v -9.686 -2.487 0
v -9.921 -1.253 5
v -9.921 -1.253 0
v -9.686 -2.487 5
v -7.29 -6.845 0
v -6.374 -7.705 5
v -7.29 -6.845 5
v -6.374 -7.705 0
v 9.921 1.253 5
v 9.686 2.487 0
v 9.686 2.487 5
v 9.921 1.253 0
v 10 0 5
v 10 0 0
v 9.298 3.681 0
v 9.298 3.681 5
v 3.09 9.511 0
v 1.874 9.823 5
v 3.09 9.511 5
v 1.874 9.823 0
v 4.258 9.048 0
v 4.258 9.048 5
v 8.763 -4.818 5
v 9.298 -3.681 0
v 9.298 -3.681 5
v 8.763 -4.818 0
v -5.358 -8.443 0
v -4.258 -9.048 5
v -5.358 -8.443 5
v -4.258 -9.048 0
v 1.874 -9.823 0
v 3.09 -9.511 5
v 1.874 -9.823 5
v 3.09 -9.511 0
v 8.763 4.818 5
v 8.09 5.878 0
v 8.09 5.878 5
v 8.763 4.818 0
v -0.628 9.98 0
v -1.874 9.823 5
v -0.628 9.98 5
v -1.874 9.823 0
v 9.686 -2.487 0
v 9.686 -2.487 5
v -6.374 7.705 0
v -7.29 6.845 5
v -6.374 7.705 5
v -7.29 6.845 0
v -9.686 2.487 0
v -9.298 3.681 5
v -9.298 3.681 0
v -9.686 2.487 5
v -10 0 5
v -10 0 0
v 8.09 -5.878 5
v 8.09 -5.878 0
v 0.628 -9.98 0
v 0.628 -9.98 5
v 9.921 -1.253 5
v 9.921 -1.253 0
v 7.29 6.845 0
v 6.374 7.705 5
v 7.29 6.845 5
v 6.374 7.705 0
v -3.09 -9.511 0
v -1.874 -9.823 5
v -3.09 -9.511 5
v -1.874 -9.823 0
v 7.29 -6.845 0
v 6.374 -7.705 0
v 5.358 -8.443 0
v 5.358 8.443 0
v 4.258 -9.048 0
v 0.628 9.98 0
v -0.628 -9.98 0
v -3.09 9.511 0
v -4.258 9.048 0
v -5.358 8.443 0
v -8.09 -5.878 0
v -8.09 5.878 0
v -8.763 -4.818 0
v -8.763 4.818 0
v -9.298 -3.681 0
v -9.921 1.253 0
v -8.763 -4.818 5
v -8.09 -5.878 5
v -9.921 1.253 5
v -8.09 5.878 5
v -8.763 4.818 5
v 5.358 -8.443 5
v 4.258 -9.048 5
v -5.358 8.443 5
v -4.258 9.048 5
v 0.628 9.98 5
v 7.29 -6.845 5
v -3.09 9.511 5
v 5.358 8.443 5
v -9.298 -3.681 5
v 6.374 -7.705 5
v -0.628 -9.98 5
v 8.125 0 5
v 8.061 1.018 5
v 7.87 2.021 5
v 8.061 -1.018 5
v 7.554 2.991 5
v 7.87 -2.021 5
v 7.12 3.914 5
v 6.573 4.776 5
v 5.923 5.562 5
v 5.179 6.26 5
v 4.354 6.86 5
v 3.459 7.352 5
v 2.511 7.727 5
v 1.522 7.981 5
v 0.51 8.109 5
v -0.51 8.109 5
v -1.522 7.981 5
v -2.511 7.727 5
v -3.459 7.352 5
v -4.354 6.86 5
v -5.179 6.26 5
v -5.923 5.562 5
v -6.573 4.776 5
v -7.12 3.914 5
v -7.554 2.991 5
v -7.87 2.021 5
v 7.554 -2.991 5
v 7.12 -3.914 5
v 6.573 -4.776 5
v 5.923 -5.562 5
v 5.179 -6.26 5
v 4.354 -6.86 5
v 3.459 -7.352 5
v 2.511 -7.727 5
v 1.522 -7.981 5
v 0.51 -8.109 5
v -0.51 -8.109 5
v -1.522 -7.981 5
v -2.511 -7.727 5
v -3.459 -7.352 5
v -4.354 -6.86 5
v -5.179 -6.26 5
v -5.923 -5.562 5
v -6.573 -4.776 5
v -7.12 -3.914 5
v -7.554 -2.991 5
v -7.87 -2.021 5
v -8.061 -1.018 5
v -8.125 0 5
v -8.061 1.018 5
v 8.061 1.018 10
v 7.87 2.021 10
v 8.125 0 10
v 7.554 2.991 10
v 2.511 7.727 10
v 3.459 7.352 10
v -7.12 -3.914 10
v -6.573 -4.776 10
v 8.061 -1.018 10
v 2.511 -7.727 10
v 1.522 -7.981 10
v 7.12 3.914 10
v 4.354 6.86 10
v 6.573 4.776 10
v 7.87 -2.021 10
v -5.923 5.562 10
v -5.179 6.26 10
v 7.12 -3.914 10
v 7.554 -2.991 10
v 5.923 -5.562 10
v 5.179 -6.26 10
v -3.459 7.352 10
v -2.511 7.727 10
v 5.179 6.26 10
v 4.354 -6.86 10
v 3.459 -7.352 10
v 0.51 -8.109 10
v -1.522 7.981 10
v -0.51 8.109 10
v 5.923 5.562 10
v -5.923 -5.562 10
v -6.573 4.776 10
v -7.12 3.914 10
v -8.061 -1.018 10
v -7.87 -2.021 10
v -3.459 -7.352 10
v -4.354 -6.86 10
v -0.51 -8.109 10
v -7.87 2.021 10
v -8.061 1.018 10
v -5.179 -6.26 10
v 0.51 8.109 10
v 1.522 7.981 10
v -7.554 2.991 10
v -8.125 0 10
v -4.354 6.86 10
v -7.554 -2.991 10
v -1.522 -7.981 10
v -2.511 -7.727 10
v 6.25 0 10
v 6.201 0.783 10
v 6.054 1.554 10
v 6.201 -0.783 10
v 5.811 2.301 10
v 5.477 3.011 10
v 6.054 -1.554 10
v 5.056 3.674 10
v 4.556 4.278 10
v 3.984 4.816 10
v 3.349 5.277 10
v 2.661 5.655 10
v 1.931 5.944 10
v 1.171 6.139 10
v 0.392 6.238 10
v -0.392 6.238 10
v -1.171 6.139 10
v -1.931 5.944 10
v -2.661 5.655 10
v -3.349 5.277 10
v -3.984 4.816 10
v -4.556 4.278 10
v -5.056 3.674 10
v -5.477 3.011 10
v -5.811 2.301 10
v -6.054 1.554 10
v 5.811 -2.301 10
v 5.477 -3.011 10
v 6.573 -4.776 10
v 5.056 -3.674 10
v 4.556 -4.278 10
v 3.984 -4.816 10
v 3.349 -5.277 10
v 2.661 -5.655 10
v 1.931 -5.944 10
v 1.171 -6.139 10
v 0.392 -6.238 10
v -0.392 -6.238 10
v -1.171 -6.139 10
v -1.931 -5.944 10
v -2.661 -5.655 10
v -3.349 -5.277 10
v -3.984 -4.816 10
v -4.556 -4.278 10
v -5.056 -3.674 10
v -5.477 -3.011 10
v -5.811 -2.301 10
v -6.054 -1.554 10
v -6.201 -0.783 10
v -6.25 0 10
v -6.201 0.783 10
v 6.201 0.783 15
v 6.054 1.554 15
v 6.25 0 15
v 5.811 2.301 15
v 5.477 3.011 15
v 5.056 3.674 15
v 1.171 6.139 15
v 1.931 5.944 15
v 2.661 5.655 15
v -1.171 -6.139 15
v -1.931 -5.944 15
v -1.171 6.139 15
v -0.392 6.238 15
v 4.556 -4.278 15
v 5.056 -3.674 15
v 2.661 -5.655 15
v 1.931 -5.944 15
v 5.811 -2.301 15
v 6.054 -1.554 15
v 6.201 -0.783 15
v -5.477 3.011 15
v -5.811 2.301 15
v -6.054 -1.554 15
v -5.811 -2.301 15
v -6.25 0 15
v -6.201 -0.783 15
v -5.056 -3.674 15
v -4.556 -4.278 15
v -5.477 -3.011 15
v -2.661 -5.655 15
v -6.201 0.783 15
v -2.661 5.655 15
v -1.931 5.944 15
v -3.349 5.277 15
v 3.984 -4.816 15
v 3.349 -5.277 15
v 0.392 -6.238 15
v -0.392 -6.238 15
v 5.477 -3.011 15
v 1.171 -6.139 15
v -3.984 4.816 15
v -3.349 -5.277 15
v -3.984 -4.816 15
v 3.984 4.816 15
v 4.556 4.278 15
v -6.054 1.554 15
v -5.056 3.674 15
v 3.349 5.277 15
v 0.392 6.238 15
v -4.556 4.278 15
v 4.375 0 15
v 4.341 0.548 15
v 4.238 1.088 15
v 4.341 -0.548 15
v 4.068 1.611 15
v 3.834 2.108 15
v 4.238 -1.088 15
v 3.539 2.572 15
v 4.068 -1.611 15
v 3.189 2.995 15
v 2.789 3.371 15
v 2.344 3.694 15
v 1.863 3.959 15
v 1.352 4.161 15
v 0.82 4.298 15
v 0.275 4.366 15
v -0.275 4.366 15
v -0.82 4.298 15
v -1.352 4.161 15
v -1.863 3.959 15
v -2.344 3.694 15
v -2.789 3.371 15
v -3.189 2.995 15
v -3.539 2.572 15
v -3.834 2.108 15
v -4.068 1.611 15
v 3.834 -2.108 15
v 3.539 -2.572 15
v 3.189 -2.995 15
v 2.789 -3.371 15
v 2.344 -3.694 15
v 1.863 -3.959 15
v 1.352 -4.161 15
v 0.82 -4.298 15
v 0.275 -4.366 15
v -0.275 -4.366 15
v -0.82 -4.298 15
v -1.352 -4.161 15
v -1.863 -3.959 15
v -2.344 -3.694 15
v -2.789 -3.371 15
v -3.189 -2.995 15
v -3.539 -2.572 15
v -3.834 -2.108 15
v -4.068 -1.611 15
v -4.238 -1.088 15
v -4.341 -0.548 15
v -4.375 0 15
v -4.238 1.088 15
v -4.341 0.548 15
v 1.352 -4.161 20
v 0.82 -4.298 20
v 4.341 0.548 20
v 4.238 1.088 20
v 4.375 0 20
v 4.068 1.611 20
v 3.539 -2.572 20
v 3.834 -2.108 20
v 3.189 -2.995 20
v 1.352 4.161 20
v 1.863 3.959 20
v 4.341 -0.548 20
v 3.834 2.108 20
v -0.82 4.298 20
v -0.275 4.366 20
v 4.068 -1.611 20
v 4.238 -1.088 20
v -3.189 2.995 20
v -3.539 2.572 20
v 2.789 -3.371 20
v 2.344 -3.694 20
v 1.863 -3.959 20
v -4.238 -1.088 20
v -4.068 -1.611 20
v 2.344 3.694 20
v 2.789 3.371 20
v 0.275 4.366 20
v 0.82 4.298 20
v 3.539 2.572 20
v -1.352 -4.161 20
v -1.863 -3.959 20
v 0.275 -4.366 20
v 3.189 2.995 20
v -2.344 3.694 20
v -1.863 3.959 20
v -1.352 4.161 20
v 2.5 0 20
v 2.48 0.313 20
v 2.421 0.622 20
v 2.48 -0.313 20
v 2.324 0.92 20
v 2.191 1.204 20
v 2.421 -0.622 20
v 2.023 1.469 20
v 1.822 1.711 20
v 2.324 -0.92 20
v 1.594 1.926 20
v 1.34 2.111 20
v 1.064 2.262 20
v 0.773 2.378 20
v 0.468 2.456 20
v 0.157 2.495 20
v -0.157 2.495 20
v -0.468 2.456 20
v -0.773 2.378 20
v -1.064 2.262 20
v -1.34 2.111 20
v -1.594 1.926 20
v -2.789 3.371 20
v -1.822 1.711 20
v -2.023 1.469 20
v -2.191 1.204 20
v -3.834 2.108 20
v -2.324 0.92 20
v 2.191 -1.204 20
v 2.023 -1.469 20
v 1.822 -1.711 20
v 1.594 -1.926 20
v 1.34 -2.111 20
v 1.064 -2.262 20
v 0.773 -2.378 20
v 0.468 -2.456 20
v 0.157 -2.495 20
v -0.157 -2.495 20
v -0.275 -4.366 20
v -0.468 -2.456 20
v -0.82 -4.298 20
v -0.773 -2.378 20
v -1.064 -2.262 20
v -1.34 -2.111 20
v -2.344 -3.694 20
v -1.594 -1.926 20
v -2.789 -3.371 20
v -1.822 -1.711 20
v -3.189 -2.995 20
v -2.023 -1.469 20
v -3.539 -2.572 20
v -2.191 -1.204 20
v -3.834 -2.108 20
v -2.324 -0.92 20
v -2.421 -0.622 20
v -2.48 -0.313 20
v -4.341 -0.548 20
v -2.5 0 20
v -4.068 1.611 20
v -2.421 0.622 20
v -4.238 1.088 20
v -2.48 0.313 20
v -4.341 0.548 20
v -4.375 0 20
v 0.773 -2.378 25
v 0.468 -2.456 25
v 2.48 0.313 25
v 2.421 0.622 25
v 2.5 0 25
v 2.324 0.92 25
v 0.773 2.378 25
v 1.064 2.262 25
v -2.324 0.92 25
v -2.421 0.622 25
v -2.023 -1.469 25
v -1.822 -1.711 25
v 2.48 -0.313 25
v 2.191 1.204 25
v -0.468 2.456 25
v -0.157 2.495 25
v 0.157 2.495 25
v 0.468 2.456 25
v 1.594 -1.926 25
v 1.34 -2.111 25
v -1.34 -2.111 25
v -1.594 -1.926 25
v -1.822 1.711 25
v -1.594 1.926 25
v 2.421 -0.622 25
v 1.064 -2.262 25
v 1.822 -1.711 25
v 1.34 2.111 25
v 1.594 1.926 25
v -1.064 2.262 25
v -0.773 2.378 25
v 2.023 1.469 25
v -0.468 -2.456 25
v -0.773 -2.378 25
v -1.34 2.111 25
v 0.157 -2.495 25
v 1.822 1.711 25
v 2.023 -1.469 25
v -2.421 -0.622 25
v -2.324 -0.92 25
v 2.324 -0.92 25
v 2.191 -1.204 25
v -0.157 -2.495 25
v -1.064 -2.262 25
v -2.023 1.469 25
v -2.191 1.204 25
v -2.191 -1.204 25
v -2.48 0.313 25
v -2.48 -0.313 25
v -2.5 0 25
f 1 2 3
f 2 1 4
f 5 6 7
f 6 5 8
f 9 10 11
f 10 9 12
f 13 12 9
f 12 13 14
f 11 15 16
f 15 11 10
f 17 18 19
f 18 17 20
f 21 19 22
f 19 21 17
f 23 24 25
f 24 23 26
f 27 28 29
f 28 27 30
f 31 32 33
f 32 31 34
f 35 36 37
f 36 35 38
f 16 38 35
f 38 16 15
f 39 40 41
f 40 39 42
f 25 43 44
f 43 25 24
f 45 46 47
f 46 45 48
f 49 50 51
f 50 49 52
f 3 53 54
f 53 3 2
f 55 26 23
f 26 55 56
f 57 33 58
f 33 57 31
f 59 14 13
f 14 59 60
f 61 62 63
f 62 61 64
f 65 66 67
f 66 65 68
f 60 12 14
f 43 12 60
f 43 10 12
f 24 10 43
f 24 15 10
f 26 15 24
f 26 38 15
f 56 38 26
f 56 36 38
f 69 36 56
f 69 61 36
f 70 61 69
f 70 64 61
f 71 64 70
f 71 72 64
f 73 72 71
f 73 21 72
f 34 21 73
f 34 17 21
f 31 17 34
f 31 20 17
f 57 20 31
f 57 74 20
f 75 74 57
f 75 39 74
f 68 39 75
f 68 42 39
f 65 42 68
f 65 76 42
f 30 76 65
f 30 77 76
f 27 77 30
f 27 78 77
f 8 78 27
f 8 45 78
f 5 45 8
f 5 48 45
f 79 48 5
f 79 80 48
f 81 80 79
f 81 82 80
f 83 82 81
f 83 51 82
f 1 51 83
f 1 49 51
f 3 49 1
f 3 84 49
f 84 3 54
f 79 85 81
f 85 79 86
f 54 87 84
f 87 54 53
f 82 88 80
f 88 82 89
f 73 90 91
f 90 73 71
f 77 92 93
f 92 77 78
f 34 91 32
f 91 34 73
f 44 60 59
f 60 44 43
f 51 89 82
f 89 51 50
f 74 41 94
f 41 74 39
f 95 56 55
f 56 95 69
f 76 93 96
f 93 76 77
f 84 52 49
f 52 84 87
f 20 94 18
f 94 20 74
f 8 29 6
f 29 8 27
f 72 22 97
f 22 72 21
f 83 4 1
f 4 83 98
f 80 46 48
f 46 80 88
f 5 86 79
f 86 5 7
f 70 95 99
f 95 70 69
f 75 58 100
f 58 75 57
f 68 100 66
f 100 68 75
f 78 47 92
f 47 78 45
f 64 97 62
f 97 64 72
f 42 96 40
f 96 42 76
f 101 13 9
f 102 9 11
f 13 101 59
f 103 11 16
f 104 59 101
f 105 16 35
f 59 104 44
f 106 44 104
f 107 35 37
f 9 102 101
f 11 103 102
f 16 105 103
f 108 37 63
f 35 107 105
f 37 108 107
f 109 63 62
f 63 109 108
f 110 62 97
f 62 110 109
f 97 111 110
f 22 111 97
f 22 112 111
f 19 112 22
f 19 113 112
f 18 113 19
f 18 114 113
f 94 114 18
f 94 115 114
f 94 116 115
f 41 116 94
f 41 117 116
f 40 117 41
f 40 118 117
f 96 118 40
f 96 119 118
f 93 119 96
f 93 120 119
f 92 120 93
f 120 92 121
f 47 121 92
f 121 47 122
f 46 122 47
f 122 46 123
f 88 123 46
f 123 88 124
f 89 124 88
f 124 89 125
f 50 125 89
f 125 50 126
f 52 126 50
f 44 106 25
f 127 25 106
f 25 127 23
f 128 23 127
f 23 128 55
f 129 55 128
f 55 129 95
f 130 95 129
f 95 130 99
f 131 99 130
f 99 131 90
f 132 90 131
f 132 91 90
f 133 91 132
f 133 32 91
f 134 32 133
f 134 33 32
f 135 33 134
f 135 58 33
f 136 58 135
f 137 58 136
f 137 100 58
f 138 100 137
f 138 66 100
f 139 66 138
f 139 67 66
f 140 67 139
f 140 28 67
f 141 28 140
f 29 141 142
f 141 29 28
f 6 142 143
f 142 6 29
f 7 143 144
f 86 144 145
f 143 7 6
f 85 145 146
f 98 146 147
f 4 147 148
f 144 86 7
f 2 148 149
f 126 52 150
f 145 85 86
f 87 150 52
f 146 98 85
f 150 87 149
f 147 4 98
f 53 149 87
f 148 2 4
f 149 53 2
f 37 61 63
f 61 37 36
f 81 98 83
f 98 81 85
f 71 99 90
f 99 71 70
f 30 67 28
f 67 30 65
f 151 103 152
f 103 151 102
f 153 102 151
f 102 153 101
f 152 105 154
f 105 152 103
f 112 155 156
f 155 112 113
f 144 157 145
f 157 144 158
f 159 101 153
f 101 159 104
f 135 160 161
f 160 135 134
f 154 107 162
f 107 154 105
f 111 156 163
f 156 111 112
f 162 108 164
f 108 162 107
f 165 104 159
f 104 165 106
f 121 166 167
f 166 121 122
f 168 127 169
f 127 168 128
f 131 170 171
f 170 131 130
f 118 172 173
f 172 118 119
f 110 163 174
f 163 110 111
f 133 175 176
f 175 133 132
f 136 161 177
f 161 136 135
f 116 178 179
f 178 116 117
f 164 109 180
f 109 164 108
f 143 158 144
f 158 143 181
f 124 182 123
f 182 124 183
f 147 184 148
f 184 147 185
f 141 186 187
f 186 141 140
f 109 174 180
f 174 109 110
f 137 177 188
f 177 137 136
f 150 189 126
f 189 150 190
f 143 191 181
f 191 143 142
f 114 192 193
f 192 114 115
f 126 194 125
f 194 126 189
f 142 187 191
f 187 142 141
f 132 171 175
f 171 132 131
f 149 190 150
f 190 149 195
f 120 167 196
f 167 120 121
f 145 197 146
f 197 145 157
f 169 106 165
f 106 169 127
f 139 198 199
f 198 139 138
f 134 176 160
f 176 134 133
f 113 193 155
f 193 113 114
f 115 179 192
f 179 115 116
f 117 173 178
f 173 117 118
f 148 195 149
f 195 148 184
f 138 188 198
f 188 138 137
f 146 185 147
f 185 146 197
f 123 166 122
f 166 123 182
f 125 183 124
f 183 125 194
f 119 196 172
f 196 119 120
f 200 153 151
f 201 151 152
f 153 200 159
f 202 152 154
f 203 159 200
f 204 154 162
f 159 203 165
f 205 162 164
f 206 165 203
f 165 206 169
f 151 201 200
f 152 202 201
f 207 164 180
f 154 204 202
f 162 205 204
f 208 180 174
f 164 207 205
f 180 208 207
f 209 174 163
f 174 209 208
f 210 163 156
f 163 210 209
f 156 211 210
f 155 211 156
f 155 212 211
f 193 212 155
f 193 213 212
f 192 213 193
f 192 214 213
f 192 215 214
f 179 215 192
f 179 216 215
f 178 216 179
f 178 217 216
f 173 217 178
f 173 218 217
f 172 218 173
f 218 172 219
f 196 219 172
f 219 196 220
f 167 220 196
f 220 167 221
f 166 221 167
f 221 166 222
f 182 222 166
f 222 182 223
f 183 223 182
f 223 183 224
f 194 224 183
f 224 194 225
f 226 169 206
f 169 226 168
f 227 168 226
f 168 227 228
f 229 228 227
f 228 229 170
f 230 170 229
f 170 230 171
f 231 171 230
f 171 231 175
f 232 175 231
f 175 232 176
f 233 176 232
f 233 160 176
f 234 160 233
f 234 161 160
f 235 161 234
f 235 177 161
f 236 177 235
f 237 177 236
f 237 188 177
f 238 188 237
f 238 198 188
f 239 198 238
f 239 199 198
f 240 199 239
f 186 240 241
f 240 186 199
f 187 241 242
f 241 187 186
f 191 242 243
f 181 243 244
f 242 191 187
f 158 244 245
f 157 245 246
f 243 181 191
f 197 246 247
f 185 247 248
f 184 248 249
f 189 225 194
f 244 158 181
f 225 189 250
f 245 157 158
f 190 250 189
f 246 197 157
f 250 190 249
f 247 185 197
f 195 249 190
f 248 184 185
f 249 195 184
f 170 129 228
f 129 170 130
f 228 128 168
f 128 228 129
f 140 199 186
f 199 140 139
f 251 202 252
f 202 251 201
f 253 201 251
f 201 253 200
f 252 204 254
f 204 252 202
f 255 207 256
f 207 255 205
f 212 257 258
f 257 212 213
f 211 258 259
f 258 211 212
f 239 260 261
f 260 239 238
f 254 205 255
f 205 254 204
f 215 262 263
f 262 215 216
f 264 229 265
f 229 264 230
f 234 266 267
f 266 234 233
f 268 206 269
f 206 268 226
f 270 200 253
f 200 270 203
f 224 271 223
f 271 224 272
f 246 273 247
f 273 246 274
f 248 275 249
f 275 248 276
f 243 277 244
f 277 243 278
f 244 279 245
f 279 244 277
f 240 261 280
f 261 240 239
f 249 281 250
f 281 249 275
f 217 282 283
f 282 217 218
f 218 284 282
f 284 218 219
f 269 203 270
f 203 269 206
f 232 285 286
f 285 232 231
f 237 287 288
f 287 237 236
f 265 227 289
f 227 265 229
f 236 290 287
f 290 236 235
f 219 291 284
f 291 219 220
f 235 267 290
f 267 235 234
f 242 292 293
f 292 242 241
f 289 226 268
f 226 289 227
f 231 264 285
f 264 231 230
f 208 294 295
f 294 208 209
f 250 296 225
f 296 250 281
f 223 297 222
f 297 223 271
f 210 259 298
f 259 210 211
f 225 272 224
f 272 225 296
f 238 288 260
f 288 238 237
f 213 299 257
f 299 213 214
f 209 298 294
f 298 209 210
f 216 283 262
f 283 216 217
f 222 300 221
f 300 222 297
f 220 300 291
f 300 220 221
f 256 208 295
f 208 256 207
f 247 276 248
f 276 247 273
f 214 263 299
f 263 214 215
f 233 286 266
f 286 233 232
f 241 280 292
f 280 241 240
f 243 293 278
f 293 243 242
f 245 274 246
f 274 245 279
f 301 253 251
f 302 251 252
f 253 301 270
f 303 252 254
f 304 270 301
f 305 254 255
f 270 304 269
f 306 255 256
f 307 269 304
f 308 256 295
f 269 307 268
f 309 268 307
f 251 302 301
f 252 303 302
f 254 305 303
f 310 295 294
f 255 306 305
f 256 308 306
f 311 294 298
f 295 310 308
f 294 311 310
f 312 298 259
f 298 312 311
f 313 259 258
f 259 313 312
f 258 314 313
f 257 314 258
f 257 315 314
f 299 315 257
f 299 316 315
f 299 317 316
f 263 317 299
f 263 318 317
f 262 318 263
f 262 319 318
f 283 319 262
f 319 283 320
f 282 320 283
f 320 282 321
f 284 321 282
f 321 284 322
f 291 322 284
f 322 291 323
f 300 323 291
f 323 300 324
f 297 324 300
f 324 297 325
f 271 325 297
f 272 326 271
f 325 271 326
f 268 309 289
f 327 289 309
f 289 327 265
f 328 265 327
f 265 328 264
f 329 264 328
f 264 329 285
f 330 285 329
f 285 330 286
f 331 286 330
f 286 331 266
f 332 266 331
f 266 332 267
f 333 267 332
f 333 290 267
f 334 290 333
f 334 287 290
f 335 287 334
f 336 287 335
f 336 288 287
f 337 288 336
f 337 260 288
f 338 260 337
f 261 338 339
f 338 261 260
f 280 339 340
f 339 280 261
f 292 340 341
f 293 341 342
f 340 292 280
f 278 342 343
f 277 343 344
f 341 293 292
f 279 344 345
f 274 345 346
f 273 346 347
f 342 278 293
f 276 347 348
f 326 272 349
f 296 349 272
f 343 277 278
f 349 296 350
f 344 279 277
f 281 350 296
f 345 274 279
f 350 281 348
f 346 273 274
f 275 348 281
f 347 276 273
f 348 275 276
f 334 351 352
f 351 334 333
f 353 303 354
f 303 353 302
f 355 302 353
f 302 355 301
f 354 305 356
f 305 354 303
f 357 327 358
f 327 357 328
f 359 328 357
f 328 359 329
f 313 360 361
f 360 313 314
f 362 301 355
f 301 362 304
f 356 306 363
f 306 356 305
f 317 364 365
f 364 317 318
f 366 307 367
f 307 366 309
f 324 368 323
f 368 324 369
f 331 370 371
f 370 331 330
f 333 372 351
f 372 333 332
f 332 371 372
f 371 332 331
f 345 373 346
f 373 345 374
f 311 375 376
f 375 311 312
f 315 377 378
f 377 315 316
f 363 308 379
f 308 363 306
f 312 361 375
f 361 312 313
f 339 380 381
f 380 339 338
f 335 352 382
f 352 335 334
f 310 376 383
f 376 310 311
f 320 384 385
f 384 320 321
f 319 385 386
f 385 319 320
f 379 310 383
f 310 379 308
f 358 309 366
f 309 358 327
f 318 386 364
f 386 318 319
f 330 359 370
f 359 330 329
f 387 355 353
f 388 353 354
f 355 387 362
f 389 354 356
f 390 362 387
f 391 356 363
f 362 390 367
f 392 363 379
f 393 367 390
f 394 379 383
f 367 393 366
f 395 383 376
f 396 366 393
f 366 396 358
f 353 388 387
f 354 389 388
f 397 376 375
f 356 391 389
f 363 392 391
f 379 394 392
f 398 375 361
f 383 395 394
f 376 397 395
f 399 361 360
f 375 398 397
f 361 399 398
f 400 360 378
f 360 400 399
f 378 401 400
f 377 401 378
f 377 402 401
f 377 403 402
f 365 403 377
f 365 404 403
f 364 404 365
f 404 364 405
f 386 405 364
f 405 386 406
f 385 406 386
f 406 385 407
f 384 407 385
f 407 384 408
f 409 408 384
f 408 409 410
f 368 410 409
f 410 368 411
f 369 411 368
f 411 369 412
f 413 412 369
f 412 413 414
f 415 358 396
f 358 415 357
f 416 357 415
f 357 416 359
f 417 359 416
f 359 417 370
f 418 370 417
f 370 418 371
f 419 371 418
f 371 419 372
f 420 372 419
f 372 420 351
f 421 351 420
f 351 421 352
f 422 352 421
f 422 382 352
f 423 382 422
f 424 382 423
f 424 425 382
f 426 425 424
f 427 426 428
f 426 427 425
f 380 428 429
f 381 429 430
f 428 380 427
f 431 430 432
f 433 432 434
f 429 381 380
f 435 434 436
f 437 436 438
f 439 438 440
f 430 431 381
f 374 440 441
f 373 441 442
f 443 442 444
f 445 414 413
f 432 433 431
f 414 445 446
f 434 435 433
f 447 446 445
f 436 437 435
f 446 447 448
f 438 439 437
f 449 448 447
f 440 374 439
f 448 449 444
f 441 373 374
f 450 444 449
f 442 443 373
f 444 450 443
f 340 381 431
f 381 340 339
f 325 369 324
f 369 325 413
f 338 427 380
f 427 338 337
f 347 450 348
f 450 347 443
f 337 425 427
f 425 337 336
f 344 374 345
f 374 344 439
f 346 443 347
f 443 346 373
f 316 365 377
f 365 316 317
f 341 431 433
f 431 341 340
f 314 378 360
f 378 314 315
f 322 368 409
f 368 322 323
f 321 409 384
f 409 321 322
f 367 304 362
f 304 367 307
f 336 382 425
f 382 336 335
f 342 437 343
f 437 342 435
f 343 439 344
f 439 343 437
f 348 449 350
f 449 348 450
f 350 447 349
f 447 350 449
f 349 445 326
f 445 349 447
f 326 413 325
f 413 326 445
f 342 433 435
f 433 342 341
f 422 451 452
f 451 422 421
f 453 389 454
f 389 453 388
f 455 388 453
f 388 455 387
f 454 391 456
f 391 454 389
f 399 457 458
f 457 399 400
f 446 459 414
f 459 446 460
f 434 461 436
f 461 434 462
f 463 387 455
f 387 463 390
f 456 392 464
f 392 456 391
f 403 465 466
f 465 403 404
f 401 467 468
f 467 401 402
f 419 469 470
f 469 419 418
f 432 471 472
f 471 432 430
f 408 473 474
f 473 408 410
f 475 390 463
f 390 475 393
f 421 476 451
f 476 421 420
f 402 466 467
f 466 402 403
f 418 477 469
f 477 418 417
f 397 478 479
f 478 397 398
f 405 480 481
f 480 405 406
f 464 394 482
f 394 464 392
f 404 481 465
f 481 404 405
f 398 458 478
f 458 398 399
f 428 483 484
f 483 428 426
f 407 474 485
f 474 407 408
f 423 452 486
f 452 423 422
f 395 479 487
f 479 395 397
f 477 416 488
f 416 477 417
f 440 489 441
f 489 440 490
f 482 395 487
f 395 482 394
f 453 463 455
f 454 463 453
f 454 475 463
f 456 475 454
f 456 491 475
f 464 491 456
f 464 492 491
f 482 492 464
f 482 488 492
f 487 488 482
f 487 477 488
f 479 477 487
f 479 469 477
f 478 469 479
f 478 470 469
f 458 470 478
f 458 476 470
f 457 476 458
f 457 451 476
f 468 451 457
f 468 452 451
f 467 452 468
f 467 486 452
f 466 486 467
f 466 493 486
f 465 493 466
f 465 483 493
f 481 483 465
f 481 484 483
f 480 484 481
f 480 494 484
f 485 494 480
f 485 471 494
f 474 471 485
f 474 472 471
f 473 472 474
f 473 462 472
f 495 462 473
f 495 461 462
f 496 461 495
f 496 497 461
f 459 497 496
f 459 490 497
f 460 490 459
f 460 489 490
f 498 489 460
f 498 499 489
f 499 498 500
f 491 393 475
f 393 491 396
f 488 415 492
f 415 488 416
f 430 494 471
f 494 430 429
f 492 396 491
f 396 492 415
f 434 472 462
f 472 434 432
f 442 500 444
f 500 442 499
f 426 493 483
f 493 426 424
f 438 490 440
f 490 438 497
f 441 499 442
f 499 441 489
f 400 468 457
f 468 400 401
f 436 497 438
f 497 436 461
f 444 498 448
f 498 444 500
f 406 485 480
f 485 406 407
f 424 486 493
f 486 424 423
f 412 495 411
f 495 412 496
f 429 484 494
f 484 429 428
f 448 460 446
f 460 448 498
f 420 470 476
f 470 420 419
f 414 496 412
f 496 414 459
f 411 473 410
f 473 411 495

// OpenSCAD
bottomDia=20; //largest Dia on the bottom
topDia=5; //smallest Diameter on the Tip
slices=5; //number of slices
sliceThck=5; //thickness of each slice
$fn=50;

diaTower();

module diaTower(){
  //build a tower out of slices with reducing diameter
  diaPerSlice=(bottomDia-topDia)/(slices-1);
  echo(diaPerSlice);
  for (iz=[0:slices-1])
    translate([0,0,iz*sliceThck]) cylinder(d=bottomDia-iz*diaPerSlice,h=sliceThck);
}
